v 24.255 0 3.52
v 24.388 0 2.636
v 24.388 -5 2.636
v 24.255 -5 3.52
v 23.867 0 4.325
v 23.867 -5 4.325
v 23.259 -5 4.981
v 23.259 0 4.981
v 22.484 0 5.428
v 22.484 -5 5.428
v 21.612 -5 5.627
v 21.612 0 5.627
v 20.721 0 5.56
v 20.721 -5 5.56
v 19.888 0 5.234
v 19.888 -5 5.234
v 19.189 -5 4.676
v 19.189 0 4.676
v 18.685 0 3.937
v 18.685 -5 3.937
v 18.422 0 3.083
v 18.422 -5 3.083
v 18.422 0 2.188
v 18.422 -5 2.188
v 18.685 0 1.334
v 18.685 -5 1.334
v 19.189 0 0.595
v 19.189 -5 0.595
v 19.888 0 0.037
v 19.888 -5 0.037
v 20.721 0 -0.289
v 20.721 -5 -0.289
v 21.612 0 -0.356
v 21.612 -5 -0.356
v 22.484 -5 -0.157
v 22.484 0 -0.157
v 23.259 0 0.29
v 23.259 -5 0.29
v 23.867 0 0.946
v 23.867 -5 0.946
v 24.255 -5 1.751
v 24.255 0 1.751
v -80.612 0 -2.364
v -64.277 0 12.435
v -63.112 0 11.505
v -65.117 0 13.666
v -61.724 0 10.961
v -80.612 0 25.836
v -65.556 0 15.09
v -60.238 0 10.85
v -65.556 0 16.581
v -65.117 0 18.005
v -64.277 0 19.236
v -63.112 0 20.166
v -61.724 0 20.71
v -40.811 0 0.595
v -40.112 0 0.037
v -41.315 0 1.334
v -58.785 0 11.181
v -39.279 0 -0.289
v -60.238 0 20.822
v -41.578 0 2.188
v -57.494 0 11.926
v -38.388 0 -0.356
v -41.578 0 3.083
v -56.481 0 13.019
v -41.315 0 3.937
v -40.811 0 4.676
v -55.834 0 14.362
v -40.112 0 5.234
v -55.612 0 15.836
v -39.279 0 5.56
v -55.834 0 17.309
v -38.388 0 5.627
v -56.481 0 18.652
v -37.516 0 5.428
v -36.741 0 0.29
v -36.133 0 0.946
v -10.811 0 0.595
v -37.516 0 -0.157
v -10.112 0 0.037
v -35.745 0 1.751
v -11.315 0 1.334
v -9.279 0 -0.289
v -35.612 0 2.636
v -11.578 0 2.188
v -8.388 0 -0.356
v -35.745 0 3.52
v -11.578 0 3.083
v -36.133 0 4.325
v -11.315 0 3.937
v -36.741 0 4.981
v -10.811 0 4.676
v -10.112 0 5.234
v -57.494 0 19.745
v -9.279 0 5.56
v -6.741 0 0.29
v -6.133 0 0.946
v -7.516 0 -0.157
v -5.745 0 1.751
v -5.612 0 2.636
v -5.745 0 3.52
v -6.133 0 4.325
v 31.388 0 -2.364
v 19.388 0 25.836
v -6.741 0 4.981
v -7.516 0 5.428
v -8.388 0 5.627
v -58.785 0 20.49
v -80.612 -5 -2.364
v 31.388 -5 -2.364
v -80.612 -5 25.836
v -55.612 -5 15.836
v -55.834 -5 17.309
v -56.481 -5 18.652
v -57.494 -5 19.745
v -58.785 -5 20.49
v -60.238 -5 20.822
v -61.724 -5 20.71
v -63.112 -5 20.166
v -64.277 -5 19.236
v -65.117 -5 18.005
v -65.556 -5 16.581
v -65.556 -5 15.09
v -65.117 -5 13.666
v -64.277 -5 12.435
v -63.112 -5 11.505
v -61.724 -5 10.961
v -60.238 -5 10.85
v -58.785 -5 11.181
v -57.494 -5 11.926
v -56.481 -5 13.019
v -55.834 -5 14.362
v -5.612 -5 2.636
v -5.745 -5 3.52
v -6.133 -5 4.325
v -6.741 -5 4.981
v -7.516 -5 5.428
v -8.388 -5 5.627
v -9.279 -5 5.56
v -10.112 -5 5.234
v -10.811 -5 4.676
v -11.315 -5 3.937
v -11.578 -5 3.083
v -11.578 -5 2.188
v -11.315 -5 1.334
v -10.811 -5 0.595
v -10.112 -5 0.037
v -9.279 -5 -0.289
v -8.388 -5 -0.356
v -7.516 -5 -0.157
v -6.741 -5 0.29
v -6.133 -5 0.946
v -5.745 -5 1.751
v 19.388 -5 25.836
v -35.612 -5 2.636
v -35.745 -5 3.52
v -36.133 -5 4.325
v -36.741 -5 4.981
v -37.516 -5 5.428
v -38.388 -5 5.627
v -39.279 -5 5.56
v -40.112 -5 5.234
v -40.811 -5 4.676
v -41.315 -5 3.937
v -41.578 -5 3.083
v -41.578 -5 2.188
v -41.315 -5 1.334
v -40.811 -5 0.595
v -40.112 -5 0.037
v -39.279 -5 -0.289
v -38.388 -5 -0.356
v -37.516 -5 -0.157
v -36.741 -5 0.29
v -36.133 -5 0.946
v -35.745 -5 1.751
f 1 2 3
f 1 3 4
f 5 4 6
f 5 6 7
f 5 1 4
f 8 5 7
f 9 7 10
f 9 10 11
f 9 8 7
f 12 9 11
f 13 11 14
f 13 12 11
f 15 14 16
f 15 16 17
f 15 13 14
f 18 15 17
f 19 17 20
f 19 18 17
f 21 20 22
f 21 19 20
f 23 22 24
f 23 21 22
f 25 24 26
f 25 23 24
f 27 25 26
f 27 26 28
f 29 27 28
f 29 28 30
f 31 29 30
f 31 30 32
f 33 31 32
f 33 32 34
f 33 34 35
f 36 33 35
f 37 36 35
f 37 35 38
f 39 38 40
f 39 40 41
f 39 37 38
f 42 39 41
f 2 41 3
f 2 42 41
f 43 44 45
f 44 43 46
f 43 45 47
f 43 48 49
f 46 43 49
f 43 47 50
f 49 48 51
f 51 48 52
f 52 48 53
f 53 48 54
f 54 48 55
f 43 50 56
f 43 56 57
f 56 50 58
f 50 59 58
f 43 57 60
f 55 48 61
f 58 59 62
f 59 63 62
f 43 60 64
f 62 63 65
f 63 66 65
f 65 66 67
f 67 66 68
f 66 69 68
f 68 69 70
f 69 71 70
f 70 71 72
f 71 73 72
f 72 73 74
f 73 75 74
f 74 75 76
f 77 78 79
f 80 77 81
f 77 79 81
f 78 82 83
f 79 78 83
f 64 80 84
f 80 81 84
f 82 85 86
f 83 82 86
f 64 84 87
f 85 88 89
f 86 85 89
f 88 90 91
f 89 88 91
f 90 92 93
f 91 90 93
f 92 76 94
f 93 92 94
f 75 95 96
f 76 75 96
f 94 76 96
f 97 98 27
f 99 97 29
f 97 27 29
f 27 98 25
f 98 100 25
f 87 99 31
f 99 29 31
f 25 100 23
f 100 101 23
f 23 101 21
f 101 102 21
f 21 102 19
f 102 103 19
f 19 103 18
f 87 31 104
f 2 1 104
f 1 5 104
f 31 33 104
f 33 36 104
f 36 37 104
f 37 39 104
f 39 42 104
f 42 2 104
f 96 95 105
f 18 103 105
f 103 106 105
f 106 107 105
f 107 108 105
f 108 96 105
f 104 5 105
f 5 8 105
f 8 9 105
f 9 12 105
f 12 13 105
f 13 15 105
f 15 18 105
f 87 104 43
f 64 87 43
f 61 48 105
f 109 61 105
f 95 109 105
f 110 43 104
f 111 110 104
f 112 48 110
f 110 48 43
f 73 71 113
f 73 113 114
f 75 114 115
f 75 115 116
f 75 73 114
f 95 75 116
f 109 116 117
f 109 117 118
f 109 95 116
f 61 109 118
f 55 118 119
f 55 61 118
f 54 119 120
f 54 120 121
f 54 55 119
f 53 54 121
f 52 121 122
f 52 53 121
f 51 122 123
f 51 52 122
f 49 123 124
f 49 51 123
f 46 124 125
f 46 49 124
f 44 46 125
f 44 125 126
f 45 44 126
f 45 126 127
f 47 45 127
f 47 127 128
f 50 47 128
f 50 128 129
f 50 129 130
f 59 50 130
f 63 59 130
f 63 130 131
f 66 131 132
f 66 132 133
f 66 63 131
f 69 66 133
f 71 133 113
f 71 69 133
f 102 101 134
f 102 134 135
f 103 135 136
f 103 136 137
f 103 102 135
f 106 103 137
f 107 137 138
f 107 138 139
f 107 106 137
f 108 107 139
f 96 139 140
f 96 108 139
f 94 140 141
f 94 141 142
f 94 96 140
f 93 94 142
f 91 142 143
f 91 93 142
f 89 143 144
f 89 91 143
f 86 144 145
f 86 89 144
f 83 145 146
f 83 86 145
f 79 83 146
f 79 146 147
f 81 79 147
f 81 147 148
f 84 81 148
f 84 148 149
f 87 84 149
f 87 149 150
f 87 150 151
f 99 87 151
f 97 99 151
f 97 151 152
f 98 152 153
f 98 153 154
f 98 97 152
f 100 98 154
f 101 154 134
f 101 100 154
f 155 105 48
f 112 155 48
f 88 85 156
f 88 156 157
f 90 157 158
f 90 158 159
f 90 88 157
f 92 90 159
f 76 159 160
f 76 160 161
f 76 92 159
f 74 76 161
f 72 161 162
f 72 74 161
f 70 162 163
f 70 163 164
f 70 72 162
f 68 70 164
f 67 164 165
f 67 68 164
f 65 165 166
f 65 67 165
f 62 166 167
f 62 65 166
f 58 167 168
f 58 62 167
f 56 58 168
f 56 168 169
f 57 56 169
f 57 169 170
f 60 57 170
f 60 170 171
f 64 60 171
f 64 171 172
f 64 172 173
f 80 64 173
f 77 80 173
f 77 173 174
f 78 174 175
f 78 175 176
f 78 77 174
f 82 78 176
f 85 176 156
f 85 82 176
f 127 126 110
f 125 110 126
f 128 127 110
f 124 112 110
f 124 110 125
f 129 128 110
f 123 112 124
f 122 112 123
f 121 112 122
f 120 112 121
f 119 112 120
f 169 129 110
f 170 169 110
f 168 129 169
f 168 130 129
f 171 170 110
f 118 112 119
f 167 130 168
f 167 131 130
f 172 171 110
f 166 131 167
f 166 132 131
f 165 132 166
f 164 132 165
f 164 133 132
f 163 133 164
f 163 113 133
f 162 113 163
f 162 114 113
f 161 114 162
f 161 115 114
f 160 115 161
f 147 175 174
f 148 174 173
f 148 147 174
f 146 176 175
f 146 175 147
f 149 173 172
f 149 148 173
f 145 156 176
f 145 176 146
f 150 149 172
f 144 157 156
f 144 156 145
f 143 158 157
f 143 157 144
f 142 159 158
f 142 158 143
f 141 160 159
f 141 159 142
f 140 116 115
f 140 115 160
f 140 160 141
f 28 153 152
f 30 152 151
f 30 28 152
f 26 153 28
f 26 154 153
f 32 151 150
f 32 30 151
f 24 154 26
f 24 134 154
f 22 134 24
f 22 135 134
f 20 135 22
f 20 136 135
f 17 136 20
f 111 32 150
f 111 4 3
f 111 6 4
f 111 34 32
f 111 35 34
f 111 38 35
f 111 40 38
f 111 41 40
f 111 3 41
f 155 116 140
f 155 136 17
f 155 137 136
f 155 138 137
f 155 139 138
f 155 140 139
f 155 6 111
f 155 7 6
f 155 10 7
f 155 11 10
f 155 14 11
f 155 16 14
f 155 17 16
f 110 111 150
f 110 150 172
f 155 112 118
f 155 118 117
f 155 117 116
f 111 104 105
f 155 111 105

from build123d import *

# Parameters (mm, degrees)
F0_R      = 3
F0_R_2    = 5
F1_DEPTH  = 5
F1_FACE_W = 100
F1_FACE_H = 5
F2_DEPTH  = 2
F3_DEPTH  = 5


with BuildPart() as f1:
    # F0 (on Front) → F1 (new body)
    with BuildSketch(Plane.XZ):
        Polygon((-80.611844, -2.364473), (31.388156, -2.364473), (19.388156, 25.835527), (-80.611844, 25.835527), align=None)
        with Locations((-38.611844, 2.635527)):
            Circle(F0_R, mode=Mode.SUBTRACT)
        with Locations((-8.611844, 2.635527)):
            Circle(F0_R, mode=Mode.SUBTRACT)
        with Locations((21.388156, 2.635527)):
            Circle(F0_R, mode=Mode.SUBTRACT)
        with Locations((-60.611844, 15.835527)):
            Circle(F0_R_2, mode=Mode.SUBTRACT)
    extrude(amount=F1_DEPTH)

    # F1_face (on face) → F2 (cut)
    with BuildSketch(Plane(origin=(-30.611844, -2.5, 25.835527), x_dir=(1, 0, 0), z_dir=(0, 0, 1))):
        Rectangle(F1_FACE_W, F1_FACE_H)
    extrude(amount=-F2_DEPTH, mode=Mode.SUBTRACT)

    # F0 (on Front) → F3 (join)
    with BuildSketch(Plane.XZ):
        Polygon((-80.611844, -2.364473), (31.388156, -2.364473), (19.388156, 25.835527), (-80.611844, 25.835527), align=None)
        with Locations((-38.611844, 2.635527)):
            Circle(F0_R, mode=Mode.SUBTRACT)
        with Locations((-8.611844, 2.635527)):
            Circle(F0_R, mode=Mode.SUBTRACT)
        with Locations((21.388156, 2.635527)):
            Circle(F0_R, mode=Mode.SUBTRACT)
        with Locations((-60.611844, 15.835527)):
            Circle(F0_R_2, mode=Mode.SUBTRACT)
    extrude(amount=F3_DEPTH)


solid = f1.part
